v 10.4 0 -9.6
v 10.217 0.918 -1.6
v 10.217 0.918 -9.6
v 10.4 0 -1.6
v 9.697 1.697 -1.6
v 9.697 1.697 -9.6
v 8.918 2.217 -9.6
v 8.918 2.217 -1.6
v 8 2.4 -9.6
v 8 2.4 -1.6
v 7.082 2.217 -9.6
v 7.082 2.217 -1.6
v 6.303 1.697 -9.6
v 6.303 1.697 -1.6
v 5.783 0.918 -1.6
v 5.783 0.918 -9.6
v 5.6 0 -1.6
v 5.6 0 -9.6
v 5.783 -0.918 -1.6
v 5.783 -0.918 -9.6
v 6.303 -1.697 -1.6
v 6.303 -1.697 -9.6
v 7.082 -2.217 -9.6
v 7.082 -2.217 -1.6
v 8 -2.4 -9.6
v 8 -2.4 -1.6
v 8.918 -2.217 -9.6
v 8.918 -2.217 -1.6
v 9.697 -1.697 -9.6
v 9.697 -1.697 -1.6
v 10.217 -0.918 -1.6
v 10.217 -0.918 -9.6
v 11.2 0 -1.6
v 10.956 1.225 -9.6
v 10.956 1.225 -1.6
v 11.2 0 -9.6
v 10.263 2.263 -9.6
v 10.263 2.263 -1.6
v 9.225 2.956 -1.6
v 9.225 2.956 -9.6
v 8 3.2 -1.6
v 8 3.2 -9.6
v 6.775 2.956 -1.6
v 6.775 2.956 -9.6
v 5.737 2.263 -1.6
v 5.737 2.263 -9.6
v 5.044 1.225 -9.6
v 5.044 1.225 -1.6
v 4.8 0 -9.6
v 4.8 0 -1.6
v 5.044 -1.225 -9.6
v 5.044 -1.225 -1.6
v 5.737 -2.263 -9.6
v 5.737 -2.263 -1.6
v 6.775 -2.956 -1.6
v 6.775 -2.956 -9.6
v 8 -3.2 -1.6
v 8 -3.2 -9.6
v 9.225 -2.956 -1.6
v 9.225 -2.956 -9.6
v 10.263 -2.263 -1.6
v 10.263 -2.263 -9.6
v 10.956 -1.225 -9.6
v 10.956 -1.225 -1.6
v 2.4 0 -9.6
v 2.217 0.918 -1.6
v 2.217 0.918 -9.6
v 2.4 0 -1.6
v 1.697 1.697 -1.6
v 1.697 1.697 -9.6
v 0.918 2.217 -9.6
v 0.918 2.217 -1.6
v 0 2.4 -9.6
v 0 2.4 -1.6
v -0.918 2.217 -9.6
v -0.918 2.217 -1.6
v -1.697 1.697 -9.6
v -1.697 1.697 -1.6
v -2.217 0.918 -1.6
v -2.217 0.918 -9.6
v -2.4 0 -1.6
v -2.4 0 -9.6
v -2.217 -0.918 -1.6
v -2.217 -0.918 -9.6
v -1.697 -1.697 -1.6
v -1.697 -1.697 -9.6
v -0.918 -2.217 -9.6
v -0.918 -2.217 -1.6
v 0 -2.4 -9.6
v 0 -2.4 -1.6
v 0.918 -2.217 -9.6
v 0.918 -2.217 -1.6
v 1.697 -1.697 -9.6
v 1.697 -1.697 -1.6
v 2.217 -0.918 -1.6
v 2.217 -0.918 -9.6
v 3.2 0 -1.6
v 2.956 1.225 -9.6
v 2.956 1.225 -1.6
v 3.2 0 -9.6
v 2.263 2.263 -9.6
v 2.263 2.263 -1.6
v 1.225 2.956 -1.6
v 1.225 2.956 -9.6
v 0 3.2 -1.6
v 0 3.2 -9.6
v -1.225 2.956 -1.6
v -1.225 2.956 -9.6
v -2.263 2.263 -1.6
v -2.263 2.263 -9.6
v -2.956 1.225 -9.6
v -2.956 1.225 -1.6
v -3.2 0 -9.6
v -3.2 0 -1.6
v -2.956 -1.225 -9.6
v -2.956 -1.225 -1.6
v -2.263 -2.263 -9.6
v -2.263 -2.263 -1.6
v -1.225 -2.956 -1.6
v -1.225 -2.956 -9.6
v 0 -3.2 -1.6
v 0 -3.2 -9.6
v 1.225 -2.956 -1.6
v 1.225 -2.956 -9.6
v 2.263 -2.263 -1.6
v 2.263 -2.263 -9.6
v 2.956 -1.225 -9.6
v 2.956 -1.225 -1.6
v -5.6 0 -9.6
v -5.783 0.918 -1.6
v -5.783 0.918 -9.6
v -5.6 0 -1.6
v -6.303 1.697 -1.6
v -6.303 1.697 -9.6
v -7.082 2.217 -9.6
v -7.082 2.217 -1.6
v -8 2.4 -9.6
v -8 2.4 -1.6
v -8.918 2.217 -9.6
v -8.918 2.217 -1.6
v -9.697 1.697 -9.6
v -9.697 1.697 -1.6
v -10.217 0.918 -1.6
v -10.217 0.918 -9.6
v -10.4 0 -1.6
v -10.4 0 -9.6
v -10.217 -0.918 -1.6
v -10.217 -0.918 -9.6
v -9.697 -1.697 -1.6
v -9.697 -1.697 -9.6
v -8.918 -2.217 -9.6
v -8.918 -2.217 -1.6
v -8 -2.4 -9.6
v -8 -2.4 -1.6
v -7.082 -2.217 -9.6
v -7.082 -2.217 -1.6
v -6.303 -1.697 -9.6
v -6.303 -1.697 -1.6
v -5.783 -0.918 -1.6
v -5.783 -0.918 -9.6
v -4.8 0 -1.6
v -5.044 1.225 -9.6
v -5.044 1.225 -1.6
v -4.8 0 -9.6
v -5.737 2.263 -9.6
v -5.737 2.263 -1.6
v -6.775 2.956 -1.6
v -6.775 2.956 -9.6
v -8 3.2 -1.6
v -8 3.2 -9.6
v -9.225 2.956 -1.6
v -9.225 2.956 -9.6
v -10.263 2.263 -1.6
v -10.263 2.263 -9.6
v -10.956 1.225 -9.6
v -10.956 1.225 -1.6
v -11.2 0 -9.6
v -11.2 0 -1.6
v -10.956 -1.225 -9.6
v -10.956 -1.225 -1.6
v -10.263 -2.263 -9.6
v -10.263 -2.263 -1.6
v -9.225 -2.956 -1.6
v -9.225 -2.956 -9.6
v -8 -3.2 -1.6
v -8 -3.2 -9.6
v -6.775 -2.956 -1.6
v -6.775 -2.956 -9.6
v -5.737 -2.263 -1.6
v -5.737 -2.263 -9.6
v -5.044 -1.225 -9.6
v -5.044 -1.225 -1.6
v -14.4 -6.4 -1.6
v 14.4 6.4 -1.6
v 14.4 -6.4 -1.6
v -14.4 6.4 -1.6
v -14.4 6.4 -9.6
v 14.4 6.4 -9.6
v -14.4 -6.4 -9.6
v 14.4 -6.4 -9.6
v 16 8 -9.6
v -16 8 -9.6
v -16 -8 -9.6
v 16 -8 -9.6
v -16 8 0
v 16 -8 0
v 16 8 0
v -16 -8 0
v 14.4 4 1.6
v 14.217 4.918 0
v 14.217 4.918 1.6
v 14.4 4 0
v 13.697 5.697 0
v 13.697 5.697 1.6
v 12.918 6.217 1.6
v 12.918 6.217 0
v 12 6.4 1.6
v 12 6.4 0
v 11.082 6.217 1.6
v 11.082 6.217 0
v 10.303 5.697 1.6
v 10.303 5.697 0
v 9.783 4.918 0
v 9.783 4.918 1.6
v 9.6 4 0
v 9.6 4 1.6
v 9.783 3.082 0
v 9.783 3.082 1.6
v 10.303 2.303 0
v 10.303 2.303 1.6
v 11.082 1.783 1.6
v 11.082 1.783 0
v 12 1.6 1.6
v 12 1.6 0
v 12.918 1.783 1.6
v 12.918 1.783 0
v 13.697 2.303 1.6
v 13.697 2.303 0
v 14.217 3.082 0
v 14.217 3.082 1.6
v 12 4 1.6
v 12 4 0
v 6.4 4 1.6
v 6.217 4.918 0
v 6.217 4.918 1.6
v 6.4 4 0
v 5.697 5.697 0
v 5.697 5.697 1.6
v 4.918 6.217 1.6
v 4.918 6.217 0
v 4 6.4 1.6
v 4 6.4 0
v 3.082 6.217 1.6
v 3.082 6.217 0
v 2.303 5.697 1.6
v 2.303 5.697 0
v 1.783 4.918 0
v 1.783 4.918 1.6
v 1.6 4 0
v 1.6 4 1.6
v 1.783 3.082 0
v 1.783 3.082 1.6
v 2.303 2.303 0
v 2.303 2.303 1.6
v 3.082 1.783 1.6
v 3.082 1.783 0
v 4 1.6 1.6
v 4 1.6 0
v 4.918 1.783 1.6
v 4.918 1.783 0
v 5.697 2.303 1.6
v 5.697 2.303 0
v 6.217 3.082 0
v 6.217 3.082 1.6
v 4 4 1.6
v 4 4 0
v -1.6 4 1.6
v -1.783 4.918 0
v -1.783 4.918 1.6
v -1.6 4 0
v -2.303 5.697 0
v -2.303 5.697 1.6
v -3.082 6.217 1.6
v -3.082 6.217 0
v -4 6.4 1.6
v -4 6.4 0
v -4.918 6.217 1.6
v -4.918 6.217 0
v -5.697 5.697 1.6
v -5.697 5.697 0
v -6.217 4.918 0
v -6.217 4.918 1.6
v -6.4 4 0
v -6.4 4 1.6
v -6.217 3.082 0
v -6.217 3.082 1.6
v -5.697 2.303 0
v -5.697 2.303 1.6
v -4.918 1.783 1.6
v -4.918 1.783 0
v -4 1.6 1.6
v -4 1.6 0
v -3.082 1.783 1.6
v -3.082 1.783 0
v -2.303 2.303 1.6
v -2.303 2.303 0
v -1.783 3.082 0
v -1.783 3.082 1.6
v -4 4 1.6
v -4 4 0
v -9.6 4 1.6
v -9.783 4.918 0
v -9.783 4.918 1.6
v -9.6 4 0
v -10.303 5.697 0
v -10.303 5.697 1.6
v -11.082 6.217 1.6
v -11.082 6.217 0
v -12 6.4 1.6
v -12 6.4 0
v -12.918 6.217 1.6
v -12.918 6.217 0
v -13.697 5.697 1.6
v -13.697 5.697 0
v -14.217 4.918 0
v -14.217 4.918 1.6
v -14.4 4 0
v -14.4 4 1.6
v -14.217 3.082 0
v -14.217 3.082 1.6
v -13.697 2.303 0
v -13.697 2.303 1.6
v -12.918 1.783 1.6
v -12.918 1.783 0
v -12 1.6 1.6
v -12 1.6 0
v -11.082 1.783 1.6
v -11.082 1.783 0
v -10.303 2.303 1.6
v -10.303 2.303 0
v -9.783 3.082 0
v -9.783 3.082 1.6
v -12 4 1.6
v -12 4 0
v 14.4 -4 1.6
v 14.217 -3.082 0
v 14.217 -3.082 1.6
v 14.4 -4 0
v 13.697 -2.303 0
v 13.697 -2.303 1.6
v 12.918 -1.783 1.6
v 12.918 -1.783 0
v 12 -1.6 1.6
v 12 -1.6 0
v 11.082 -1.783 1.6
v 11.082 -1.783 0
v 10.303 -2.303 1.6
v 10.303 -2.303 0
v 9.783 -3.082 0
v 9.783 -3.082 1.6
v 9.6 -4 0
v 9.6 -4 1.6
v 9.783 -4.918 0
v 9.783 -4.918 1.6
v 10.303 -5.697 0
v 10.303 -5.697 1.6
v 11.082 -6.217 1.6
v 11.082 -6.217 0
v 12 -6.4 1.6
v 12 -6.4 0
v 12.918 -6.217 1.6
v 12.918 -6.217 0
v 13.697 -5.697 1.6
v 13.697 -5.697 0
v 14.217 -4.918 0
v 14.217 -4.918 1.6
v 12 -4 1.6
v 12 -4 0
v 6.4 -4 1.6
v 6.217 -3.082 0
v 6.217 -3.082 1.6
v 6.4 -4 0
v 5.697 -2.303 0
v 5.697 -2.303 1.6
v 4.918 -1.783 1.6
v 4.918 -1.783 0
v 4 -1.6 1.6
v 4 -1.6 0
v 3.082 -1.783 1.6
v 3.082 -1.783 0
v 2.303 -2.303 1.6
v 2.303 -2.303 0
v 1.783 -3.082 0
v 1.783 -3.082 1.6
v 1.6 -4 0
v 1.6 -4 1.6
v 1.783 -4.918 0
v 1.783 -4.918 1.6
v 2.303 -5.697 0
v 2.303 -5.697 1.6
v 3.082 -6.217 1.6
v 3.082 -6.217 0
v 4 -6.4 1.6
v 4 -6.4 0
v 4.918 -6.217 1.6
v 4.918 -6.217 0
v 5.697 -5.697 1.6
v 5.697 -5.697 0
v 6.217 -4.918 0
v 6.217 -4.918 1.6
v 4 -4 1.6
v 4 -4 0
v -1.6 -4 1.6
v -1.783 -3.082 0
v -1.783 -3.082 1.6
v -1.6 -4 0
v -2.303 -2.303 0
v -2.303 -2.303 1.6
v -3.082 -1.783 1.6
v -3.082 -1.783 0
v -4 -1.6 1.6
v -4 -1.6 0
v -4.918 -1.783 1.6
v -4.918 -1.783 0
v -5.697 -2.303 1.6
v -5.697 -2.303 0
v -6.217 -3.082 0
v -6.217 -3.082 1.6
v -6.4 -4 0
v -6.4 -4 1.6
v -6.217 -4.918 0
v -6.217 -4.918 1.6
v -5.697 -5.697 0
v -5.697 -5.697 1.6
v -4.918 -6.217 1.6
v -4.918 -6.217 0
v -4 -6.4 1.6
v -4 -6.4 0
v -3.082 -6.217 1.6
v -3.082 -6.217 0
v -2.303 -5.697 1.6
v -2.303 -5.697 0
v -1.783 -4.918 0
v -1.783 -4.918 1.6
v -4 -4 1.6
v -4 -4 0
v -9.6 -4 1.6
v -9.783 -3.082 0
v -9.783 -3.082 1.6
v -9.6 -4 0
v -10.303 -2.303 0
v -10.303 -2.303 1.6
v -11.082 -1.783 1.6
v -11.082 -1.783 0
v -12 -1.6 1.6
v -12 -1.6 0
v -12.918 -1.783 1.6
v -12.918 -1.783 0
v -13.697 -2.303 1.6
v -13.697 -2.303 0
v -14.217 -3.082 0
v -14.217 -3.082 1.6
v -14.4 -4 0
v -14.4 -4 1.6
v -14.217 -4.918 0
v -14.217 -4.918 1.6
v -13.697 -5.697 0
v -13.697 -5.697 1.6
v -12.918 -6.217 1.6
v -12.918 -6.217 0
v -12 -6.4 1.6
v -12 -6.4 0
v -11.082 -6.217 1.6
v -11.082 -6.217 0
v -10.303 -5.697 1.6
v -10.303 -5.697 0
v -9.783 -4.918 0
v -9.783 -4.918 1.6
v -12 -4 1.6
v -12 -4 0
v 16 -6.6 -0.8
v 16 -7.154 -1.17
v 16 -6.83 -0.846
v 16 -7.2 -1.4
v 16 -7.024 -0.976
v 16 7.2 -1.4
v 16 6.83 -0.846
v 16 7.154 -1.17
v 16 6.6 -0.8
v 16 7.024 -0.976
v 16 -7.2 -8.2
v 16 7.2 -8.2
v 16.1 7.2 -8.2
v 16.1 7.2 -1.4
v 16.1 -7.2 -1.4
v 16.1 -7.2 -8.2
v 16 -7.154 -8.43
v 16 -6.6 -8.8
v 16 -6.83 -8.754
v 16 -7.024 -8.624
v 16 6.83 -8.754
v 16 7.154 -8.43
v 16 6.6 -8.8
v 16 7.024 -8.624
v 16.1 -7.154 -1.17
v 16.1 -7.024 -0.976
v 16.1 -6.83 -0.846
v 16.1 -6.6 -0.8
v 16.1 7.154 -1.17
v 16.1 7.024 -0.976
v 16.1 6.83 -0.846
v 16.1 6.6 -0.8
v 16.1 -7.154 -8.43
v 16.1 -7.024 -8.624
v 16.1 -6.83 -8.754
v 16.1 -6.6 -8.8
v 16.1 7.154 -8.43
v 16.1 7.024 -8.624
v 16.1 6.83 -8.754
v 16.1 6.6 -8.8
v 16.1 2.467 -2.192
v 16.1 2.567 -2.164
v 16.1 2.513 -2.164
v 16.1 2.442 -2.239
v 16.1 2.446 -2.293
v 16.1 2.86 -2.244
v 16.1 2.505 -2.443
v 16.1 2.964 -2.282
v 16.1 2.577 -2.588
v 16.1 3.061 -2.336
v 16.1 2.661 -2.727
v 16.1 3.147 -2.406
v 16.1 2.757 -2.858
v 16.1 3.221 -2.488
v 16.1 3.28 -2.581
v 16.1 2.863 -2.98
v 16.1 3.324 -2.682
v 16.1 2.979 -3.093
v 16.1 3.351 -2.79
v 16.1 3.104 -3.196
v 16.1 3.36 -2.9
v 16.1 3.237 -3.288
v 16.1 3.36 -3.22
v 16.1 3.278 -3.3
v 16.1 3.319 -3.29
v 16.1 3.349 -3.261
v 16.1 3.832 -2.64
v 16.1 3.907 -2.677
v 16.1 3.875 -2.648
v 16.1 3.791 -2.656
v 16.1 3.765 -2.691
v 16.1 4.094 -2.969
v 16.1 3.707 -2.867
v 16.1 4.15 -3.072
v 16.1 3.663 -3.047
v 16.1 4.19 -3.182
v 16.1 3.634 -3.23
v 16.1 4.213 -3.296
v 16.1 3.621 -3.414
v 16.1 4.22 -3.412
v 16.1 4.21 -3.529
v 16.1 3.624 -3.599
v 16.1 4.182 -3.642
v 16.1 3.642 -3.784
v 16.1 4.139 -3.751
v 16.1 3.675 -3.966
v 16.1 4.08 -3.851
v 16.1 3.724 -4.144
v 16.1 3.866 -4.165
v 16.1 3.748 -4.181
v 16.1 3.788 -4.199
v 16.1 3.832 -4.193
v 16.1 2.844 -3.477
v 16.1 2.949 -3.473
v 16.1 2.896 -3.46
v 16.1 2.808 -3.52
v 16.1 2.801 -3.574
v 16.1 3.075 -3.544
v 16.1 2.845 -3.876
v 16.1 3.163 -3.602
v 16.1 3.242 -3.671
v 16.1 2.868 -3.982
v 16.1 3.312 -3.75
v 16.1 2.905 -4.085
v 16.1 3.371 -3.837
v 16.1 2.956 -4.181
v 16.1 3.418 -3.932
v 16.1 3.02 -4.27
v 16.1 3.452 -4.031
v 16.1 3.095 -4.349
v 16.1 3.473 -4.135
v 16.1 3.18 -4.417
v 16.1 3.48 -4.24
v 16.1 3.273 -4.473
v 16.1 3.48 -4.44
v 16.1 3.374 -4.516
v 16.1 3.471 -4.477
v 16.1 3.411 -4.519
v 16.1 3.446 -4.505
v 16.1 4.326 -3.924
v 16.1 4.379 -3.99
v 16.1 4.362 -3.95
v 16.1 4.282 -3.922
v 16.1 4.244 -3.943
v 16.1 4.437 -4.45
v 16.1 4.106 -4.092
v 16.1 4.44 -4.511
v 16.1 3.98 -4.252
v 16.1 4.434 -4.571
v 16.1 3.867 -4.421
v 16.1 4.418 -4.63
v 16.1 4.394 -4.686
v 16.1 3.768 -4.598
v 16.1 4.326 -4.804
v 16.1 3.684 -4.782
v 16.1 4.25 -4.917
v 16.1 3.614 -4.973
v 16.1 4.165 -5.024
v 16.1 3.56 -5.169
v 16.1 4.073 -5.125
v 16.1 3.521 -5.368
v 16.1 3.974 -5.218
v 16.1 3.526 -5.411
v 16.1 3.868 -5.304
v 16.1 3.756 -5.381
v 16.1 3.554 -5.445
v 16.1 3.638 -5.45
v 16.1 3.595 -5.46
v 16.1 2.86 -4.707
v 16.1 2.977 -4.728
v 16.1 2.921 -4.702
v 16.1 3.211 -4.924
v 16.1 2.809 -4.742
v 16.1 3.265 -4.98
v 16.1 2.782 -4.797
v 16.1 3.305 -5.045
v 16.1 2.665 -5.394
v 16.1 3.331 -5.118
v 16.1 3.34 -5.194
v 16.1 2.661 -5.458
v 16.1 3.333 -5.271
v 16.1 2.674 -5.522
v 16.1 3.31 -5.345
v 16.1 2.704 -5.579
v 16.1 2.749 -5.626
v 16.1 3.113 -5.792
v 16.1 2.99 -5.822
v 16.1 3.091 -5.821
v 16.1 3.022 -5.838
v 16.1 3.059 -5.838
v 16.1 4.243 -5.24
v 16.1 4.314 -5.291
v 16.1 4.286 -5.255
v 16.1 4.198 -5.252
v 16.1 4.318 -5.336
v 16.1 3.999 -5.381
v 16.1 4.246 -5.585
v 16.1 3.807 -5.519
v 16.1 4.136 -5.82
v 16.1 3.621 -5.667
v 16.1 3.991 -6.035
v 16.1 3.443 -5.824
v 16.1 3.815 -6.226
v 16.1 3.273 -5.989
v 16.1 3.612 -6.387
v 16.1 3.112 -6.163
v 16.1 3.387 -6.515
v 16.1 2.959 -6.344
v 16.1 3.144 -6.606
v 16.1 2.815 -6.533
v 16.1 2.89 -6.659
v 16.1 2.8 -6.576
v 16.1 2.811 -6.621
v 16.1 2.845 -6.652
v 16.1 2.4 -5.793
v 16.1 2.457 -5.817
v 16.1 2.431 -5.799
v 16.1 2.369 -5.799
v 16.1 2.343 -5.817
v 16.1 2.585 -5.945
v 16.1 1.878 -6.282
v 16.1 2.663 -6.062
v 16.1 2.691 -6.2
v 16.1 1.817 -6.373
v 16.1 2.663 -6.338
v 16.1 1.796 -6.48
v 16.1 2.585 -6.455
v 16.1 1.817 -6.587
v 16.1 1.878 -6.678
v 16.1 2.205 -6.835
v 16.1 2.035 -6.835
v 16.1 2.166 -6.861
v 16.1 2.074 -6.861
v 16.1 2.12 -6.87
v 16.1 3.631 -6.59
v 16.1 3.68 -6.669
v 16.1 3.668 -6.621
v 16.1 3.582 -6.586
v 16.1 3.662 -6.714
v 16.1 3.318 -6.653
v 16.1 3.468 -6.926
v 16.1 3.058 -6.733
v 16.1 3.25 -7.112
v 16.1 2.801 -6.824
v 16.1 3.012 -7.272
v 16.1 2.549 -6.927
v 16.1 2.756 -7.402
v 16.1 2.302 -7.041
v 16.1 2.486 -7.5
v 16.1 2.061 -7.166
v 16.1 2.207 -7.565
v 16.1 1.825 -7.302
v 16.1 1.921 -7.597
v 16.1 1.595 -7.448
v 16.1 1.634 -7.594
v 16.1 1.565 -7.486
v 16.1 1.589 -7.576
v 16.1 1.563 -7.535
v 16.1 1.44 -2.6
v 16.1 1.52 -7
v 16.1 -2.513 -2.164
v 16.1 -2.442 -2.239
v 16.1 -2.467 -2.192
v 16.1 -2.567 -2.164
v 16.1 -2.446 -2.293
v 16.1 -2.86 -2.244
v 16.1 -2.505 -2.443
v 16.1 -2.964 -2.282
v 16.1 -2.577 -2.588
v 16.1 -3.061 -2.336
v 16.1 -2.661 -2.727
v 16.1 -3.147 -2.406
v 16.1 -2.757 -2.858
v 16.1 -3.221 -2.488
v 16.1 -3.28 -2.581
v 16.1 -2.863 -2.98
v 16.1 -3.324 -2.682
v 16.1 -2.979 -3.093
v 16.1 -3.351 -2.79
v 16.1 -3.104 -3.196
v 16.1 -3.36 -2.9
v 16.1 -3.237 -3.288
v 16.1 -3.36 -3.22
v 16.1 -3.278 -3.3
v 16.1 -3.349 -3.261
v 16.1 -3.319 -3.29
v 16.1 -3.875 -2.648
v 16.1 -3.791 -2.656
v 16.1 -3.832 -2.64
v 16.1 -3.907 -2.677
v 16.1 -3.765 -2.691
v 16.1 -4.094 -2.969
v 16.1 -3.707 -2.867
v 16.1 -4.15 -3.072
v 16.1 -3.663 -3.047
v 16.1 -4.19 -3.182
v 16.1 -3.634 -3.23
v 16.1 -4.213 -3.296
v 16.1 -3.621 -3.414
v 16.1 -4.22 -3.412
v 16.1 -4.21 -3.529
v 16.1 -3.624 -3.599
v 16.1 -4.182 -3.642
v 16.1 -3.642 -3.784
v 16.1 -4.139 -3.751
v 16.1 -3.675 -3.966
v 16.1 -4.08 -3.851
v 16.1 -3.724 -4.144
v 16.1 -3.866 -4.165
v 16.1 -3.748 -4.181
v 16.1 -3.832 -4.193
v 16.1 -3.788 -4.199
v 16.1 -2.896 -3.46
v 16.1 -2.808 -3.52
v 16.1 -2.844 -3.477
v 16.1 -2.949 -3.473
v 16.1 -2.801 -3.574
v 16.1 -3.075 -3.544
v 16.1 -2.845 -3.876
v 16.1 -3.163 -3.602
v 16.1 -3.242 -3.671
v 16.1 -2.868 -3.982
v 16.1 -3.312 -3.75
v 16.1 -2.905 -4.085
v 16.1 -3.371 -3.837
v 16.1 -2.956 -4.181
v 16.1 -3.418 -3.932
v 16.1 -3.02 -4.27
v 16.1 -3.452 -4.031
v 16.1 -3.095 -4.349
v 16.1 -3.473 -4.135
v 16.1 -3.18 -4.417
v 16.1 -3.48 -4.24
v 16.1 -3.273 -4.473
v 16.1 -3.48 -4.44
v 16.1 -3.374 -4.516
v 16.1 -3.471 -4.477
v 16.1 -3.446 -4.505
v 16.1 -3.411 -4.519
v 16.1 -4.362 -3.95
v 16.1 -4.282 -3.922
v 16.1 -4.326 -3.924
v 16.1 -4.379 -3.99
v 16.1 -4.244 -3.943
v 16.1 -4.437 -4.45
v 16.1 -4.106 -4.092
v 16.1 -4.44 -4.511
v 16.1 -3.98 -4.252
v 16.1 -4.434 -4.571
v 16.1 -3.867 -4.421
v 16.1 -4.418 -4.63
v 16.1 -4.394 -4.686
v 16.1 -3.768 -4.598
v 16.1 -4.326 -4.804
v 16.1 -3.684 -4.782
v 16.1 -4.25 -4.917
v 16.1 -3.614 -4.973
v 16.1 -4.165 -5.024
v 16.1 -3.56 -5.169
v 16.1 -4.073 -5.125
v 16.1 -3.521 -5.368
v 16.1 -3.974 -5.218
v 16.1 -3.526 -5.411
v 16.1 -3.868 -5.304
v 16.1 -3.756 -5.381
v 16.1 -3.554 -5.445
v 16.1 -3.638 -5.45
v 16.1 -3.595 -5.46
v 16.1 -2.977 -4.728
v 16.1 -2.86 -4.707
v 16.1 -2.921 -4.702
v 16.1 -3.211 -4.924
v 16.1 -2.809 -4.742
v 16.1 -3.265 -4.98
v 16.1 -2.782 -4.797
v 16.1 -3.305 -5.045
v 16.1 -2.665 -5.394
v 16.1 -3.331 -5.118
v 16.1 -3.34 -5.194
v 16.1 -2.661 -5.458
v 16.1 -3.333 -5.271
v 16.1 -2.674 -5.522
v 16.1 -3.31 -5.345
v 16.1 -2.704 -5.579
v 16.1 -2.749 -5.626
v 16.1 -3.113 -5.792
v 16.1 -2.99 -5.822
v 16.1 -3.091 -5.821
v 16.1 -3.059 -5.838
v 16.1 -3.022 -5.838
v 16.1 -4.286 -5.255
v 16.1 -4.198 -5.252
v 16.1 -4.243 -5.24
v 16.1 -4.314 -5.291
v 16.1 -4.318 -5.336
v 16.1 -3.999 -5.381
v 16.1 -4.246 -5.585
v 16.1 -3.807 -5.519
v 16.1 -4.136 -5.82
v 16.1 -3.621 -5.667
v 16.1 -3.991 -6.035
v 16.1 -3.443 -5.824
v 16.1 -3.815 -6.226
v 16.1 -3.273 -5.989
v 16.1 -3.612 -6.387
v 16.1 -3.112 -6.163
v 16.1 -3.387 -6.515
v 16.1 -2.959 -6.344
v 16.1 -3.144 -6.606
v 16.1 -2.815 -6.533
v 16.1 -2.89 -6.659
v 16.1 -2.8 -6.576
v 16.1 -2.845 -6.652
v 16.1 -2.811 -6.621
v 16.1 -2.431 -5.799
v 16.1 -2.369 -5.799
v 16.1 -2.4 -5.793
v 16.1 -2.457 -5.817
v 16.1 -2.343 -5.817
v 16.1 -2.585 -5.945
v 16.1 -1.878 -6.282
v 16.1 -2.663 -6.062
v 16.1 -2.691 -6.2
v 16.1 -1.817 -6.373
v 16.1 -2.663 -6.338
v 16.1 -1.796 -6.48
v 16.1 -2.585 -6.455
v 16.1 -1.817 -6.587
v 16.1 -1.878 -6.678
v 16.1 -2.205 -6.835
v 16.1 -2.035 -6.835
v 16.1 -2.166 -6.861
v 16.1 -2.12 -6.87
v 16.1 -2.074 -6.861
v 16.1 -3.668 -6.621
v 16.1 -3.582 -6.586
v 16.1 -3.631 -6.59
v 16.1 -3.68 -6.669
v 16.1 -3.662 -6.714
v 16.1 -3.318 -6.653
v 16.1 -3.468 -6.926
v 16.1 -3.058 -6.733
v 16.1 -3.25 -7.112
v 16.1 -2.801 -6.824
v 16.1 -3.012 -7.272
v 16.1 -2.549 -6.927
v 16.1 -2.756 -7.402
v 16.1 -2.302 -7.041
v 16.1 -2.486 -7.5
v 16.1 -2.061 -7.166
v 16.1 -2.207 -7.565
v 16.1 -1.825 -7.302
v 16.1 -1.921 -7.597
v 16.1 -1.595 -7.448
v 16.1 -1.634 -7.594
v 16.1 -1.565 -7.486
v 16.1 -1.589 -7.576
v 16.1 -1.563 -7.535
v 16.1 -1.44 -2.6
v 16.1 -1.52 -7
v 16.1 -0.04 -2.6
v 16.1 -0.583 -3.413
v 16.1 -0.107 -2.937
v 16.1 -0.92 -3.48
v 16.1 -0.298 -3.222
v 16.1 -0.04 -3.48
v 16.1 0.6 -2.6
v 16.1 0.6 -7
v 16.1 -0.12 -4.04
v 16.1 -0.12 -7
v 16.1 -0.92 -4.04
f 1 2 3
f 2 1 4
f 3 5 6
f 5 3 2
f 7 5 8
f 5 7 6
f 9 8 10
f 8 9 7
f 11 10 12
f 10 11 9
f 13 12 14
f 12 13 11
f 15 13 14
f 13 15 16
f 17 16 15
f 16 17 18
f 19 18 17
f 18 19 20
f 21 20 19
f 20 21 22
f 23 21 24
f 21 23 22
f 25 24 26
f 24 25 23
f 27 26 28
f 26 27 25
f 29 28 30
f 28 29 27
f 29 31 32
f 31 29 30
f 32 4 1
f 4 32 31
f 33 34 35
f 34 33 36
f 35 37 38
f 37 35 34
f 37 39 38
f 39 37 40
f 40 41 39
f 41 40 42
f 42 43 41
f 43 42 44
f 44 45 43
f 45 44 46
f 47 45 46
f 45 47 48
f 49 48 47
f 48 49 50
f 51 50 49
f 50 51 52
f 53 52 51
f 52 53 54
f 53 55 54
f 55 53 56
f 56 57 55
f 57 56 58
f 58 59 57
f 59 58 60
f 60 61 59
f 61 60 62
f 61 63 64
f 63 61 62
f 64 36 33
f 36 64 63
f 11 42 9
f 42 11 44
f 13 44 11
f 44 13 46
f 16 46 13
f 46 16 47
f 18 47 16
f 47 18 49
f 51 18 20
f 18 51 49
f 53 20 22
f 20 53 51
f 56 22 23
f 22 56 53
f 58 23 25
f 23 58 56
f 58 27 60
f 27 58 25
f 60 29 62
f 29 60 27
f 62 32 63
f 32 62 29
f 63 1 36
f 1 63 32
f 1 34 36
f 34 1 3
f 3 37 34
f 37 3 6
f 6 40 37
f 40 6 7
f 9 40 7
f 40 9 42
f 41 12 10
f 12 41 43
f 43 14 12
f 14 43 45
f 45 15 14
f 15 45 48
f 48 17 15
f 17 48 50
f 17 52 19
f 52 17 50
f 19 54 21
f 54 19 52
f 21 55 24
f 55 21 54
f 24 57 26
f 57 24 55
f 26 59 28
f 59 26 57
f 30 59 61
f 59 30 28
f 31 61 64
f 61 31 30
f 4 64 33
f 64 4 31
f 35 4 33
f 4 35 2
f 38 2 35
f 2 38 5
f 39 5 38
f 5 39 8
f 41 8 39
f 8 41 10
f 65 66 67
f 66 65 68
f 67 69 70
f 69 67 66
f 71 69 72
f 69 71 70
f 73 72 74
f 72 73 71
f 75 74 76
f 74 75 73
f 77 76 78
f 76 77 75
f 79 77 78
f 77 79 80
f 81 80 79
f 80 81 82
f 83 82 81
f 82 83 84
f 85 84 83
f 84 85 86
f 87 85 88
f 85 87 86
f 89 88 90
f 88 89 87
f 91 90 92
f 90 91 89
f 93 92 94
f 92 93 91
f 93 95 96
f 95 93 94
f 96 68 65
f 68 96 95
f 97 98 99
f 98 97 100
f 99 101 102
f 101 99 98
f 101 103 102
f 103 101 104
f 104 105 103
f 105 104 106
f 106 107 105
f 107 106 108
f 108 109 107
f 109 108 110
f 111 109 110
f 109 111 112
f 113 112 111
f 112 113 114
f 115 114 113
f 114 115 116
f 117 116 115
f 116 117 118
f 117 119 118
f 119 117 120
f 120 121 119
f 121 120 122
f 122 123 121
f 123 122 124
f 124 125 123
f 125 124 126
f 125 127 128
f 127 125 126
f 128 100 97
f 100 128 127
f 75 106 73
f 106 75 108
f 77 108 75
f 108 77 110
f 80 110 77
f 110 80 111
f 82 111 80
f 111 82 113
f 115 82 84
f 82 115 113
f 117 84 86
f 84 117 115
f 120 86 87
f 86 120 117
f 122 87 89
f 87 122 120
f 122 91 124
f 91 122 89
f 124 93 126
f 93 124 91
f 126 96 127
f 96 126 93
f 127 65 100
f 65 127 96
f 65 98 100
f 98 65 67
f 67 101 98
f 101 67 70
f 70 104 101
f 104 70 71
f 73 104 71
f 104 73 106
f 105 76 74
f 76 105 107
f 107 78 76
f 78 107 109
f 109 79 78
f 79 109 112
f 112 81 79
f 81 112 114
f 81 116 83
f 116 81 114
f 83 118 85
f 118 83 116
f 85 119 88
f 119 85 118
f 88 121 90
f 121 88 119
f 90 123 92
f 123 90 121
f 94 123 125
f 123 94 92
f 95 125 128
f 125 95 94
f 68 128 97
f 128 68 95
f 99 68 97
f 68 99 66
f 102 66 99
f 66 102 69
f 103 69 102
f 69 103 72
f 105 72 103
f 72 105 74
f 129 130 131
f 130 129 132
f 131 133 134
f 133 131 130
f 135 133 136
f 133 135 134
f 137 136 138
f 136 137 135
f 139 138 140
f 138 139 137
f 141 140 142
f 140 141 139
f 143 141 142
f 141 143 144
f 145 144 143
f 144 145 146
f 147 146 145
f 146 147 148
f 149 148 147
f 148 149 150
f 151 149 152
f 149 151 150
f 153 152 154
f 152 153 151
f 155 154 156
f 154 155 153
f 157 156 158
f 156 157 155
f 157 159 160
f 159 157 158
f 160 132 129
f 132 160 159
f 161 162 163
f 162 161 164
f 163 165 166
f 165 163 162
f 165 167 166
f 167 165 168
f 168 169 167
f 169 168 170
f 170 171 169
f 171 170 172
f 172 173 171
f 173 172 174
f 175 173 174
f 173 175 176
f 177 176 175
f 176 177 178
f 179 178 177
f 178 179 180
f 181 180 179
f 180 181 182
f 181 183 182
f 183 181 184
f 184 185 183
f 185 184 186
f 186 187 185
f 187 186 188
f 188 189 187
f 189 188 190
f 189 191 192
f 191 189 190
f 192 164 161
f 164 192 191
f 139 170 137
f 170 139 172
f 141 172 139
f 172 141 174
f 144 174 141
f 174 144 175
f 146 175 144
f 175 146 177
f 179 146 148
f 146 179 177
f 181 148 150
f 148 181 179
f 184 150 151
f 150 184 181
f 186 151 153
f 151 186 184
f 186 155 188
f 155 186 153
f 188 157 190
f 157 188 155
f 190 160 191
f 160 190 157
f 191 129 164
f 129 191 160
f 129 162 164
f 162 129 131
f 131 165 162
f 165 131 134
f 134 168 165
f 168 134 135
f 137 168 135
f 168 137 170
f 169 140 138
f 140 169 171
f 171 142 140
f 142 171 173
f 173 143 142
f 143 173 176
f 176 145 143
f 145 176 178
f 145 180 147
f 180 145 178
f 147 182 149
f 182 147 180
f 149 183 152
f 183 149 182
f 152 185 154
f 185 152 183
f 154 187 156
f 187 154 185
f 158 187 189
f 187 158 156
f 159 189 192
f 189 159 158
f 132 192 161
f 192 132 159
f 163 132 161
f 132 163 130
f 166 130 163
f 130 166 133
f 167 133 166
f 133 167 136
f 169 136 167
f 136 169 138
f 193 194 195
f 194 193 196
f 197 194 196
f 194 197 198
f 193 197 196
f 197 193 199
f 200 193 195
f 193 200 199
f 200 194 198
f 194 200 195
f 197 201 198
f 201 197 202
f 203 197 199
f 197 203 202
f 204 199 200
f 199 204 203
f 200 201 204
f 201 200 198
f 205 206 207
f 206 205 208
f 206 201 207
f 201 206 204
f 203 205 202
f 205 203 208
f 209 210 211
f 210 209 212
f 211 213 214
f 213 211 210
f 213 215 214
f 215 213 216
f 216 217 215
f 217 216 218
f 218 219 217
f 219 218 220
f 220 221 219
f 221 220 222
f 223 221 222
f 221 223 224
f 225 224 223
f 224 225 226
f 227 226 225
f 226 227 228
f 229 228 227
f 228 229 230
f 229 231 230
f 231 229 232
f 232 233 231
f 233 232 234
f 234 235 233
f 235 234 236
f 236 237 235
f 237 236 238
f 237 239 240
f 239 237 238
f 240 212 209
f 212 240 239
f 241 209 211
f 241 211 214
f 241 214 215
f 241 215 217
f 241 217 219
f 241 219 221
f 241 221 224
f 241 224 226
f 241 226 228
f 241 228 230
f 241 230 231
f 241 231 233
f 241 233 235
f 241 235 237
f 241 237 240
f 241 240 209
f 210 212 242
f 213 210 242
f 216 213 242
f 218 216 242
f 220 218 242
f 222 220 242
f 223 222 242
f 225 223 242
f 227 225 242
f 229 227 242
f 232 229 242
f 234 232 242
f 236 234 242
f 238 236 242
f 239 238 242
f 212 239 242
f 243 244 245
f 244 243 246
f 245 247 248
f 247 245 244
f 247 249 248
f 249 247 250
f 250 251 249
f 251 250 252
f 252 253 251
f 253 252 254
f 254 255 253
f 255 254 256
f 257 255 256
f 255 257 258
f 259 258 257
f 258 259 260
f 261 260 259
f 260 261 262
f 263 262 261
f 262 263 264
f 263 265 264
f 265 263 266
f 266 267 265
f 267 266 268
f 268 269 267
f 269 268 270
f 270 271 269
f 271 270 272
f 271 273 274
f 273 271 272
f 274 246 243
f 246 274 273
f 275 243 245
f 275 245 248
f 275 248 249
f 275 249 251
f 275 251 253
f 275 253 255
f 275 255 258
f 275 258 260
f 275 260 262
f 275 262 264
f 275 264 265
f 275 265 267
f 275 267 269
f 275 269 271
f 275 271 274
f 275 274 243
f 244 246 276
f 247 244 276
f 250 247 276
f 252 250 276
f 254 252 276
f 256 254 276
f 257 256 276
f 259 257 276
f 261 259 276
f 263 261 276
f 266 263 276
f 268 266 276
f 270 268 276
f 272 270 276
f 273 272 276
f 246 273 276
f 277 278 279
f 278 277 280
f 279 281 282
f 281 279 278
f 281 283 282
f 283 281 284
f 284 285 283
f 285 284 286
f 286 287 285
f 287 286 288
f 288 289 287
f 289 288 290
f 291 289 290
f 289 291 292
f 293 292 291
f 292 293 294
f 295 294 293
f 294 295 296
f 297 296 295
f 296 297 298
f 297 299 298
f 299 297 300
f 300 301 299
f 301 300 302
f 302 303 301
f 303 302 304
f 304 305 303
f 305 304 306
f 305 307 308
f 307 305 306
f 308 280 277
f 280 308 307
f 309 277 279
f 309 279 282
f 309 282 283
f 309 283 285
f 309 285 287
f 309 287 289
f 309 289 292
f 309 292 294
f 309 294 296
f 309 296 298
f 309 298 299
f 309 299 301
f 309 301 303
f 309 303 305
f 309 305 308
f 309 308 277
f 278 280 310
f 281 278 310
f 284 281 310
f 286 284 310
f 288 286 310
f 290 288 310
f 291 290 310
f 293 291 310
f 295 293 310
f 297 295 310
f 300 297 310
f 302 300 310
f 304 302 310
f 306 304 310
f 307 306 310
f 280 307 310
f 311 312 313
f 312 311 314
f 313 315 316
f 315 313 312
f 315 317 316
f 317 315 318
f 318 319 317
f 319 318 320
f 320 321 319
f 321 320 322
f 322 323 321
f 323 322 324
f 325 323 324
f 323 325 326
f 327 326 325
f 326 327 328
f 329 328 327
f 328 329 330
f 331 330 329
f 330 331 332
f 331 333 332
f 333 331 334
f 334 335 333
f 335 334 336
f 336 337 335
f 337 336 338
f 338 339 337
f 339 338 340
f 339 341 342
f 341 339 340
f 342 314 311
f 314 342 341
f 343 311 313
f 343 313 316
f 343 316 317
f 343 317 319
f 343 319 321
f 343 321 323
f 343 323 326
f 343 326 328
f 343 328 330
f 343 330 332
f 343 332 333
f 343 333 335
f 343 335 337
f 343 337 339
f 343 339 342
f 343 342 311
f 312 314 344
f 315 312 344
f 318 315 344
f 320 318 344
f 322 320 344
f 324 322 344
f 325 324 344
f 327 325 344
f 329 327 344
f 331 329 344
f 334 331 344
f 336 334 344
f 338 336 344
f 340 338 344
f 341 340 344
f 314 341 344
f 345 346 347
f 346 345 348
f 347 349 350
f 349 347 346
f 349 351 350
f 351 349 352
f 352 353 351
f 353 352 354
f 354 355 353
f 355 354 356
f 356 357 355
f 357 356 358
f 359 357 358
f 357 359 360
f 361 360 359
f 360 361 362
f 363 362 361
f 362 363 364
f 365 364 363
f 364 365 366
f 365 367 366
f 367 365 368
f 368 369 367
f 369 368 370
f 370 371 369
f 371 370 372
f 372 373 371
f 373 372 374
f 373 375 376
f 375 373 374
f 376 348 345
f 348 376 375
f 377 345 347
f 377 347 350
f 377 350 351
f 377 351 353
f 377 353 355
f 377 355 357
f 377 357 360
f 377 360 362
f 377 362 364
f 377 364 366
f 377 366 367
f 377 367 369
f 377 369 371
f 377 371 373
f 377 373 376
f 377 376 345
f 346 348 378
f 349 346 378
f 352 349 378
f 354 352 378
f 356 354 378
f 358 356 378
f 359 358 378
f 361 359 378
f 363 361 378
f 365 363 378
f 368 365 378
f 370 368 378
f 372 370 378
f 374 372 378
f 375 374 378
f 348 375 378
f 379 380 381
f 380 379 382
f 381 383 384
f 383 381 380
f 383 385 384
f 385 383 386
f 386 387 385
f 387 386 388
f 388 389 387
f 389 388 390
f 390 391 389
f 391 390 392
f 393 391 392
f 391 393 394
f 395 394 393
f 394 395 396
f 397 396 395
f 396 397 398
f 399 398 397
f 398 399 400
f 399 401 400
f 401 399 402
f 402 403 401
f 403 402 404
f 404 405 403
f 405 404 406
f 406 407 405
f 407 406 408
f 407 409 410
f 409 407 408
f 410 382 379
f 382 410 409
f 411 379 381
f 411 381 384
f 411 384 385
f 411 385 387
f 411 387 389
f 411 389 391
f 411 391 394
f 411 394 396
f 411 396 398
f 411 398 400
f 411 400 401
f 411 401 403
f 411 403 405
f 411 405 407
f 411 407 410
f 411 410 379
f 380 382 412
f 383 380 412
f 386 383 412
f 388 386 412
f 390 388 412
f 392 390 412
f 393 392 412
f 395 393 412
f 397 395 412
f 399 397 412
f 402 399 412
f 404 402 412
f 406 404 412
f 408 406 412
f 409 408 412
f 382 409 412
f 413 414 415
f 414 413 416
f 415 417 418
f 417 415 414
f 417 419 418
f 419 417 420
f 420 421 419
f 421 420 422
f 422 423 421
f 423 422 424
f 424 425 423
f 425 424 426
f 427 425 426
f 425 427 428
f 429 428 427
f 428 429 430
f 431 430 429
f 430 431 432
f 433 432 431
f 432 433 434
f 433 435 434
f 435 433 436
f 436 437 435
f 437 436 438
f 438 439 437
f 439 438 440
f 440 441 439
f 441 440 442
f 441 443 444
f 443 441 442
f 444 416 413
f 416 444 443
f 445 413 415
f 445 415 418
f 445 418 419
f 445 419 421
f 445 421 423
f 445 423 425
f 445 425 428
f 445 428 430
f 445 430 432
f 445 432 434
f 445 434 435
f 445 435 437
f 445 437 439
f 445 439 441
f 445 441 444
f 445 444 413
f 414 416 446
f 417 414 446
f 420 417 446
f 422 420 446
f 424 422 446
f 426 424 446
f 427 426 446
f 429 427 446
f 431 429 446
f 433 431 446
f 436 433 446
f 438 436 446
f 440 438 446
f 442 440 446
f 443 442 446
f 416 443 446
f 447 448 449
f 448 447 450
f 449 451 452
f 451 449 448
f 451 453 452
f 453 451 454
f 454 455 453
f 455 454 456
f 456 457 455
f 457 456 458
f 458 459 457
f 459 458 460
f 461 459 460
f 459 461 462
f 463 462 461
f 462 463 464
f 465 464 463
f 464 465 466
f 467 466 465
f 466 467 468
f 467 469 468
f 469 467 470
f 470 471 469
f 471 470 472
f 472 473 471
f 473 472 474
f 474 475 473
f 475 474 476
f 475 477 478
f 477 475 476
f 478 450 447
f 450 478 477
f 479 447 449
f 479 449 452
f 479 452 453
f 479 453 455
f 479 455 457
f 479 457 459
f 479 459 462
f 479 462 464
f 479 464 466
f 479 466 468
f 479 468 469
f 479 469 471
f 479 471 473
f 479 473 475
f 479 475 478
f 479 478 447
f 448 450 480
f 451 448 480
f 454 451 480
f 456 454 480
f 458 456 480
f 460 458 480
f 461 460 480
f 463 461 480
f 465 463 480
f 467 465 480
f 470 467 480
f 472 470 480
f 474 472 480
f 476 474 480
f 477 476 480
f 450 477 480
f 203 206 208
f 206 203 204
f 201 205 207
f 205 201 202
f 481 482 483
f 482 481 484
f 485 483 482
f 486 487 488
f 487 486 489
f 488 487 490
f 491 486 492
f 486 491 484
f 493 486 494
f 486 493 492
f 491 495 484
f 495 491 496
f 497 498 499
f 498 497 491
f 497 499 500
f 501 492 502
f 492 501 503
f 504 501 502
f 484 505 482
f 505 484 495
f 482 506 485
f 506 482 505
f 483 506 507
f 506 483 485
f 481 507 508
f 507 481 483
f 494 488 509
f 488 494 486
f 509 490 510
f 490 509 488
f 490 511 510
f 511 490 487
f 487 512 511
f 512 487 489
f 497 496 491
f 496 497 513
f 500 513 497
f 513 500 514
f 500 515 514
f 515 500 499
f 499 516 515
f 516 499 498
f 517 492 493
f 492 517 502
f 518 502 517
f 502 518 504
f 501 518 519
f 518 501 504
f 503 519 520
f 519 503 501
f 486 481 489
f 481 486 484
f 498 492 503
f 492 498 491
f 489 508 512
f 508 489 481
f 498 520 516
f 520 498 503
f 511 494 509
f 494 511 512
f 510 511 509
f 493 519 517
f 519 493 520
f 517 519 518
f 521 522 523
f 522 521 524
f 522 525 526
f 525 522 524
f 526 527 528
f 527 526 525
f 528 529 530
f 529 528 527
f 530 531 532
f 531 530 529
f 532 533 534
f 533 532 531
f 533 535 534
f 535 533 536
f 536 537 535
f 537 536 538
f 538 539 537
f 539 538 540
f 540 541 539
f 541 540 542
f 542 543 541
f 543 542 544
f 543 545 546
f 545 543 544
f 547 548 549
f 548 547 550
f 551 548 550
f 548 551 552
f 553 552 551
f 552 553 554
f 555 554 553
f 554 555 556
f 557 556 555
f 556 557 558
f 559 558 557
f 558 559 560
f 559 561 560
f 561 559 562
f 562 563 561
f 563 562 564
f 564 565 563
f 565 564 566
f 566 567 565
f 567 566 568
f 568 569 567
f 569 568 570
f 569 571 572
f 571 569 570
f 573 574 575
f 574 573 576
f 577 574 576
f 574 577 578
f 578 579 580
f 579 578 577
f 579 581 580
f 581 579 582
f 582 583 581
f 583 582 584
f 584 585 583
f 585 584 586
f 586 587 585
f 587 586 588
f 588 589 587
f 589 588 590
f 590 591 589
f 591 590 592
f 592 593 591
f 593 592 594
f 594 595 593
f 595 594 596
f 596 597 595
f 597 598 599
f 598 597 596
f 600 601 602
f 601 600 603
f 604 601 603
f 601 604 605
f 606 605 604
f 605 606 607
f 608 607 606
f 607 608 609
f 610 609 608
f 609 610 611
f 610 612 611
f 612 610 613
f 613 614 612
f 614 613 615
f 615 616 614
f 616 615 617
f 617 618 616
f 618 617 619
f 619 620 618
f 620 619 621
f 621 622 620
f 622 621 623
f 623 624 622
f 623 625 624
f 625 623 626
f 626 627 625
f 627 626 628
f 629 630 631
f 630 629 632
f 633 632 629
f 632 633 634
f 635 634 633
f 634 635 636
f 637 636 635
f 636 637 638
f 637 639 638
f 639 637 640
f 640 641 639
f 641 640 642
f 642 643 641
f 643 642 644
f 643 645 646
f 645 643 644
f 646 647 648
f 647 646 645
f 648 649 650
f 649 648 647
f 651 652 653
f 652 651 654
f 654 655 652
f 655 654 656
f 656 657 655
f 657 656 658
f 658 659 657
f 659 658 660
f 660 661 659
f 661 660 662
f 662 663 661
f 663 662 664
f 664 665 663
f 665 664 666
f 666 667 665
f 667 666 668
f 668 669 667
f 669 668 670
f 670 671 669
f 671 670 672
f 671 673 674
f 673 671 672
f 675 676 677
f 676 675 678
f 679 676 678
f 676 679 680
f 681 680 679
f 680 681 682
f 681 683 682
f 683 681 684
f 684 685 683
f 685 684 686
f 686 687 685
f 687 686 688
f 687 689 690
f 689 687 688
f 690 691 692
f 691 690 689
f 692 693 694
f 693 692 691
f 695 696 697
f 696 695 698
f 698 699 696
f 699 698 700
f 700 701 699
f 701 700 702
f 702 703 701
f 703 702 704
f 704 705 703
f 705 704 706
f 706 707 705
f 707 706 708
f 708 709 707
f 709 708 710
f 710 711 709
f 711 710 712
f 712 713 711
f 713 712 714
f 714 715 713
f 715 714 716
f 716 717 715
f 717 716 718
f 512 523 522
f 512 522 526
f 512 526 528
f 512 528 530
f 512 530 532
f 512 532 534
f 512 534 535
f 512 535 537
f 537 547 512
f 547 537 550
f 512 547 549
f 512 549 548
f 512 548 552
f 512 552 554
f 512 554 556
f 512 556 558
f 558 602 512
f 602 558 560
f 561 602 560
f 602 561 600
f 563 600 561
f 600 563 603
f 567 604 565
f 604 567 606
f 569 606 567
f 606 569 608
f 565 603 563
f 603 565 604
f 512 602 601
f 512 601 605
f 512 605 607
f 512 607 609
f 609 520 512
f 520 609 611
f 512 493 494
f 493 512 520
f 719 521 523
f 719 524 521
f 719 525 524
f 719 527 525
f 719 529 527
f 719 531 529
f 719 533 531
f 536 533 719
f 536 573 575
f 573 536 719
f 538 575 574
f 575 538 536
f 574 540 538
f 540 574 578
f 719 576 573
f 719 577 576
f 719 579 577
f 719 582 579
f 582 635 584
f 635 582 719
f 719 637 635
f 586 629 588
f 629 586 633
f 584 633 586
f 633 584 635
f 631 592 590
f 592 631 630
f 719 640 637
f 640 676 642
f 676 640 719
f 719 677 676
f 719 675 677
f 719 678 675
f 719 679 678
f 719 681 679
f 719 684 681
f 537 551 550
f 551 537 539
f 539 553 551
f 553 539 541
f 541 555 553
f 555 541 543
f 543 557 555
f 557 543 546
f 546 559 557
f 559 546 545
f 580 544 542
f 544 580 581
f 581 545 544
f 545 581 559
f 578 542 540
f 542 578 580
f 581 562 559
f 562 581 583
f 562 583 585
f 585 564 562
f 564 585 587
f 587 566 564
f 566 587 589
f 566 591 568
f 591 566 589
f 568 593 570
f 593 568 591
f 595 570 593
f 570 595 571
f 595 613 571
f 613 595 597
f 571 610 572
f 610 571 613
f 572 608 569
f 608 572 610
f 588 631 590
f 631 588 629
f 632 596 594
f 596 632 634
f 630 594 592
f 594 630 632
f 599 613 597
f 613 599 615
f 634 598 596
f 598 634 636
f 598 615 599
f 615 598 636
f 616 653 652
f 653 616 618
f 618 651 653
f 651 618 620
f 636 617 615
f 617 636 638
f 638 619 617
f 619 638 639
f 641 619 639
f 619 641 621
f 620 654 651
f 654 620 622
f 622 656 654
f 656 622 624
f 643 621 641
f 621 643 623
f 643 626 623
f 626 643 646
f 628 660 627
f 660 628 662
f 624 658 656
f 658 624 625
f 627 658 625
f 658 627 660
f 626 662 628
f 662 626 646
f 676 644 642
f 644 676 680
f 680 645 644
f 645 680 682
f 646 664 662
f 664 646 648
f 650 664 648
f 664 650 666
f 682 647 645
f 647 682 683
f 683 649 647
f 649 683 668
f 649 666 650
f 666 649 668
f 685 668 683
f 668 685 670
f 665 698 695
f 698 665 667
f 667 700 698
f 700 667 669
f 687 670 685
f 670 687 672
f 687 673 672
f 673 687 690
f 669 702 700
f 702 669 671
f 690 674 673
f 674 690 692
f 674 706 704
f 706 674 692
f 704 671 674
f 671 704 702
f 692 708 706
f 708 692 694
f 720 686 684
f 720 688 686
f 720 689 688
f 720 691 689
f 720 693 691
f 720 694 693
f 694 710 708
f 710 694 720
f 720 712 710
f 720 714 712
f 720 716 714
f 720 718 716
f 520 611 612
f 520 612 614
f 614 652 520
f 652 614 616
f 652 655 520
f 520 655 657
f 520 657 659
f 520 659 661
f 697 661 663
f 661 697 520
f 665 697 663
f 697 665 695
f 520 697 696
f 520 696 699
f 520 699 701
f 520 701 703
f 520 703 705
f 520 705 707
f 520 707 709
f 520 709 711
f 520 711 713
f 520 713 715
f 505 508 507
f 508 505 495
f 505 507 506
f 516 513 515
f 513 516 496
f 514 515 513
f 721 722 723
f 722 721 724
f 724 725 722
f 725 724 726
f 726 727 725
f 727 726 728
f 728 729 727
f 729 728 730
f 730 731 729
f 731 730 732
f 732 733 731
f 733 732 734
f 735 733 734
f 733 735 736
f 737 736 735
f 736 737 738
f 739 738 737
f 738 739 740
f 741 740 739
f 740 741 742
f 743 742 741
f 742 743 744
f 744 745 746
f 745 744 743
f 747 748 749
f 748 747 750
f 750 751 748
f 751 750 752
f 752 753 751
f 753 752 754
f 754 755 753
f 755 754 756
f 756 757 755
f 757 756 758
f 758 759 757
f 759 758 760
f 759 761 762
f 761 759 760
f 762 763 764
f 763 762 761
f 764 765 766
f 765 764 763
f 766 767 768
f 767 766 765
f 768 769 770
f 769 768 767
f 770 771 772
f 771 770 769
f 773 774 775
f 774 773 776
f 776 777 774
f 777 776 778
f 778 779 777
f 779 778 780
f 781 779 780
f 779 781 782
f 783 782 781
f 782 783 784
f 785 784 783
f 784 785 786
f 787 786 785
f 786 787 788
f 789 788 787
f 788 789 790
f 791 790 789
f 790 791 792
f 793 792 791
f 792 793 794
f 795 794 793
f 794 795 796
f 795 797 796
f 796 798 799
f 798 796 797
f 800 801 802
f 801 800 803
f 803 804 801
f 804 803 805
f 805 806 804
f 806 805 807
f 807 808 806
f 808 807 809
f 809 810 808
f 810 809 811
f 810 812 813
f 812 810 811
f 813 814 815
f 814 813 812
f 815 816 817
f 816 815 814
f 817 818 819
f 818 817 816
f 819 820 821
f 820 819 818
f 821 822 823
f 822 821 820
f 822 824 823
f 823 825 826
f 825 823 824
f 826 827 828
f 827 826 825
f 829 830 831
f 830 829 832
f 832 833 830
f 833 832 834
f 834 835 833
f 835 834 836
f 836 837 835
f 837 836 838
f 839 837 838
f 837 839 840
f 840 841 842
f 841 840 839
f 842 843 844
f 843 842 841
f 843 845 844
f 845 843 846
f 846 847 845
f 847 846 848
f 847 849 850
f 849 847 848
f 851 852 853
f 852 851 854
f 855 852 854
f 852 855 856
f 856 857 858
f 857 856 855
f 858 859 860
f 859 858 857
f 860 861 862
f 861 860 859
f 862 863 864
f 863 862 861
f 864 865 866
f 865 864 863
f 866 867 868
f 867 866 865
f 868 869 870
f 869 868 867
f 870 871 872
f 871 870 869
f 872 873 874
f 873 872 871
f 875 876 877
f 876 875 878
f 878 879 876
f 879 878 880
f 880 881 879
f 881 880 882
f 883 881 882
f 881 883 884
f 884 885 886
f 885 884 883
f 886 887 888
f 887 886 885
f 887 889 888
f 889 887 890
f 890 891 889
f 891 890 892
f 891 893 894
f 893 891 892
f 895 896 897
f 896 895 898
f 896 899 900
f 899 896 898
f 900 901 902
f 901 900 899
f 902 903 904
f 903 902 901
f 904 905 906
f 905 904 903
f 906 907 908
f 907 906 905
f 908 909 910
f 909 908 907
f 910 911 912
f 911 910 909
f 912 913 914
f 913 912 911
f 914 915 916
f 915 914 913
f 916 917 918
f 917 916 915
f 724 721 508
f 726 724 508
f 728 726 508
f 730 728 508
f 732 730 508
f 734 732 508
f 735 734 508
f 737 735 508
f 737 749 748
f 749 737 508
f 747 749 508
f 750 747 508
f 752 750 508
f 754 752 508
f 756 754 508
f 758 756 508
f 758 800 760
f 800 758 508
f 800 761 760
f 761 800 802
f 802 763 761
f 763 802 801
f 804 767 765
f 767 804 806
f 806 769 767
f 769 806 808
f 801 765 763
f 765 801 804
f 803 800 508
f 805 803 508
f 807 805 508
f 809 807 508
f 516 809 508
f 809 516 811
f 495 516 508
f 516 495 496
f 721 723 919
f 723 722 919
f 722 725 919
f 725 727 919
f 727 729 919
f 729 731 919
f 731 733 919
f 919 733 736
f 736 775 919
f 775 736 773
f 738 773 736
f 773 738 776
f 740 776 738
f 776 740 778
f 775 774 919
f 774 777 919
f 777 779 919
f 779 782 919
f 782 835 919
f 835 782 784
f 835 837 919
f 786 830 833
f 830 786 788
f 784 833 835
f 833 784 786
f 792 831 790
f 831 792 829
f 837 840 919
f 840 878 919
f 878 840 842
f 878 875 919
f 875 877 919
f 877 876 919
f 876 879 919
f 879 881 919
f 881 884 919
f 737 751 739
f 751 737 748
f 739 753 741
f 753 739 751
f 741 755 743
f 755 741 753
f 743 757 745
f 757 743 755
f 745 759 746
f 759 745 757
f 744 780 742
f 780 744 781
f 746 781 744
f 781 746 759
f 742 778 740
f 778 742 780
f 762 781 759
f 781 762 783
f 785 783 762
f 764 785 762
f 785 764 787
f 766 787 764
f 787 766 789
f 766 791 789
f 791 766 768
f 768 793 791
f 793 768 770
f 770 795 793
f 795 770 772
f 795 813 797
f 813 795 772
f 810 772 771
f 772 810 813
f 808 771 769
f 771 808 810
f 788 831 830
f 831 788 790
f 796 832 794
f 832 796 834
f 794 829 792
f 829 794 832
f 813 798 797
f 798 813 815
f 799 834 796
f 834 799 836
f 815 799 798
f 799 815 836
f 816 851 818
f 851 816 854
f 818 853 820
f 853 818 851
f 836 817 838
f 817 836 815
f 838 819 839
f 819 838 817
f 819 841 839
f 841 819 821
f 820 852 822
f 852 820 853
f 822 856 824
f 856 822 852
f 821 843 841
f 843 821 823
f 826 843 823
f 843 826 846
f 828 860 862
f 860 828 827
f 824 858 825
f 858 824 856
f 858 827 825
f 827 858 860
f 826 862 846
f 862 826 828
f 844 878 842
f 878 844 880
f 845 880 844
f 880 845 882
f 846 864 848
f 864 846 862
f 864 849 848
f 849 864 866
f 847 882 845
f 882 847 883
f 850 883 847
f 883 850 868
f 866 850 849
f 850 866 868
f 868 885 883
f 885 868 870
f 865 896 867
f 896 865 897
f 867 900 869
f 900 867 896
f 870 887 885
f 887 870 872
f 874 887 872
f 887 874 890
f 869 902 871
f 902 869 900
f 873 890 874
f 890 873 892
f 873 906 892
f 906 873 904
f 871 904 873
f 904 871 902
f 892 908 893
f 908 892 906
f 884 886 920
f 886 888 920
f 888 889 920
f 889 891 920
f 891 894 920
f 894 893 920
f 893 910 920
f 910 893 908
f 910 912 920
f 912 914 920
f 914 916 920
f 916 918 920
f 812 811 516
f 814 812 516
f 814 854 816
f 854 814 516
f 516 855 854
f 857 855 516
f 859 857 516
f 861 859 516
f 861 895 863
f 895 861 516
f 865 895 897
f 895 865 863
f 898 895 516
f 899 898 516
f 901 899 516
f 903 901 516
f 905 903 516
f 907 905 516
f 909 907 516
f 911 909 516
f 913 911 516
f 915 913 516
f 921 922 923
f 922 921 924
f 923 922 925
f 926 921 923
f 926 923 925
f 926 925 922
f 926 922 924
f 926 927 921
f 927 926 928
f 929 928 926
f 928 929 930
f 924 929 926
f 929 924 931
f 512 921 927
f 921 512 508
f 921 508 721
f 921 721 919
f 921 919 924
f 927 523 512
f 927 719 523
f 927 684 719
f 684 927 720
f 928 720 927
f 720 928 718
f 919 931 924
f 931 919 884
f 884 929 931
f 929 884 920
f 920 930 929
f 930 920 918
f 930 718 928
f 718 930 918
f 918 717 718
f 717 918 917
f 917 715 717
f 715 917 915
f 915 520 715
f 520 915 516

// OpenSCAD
use <../lib.scad>
use <3001.scad>
use <6177969ae.scad>
function ldraw_lib__3001d0h() = [
// 0 Brick  2 x  4 with Red "1" and Black Laurel Wreath Sticker
// 0 Name: 3001d0h.dat
// 0 Author: Alfred Schmitz [AlfredS]
// 0 !LDRAW_ORG Shortcut UPDATE 2026-09
// 0 !LICENSE Licensed under CC BY 4.0 : see CAreadme.txt
// 
// 0 BFC CERTIFY CCW
  [0,"BFC","CERTIFY"],
  [0,"BFC","CCW"],
// 
// 0 !CATEGORY Sticker Shortcut
// 0 !KEYWORDS Ford, GT40, Set 75881, Speed Champions
// 
// 0 !HISTORY 2026-09-30 [OrionP] Official Update 2026-09
// 
// 1 16 0 0 0 1 0 0 0 1 0 0 0 1 3001.dat
  [1,16,0,0,0,1,0,0,0,1,0,0,0,1, ldraw_lib__3001()],
// 1 16 40 12 0 0 -1 0 0 0 -1 1 0 0 6177969ae.dat
  [1,16,40,12,0,0,-1,0,0,0,-1,1,0,0, ldraw_lib__6177969ae()],
];
module ldraw_lib__3001d0h(step=0, col=false, unit=2/5, alt=false, line=0.2, solid=!$preview)
    makepoly(ldraw_lib__3001d0h(), step=step, col=col, unit=unit, alt=alt, line=line, solid=solid);
ldraw_lib__3001d0h(line=0.2);
